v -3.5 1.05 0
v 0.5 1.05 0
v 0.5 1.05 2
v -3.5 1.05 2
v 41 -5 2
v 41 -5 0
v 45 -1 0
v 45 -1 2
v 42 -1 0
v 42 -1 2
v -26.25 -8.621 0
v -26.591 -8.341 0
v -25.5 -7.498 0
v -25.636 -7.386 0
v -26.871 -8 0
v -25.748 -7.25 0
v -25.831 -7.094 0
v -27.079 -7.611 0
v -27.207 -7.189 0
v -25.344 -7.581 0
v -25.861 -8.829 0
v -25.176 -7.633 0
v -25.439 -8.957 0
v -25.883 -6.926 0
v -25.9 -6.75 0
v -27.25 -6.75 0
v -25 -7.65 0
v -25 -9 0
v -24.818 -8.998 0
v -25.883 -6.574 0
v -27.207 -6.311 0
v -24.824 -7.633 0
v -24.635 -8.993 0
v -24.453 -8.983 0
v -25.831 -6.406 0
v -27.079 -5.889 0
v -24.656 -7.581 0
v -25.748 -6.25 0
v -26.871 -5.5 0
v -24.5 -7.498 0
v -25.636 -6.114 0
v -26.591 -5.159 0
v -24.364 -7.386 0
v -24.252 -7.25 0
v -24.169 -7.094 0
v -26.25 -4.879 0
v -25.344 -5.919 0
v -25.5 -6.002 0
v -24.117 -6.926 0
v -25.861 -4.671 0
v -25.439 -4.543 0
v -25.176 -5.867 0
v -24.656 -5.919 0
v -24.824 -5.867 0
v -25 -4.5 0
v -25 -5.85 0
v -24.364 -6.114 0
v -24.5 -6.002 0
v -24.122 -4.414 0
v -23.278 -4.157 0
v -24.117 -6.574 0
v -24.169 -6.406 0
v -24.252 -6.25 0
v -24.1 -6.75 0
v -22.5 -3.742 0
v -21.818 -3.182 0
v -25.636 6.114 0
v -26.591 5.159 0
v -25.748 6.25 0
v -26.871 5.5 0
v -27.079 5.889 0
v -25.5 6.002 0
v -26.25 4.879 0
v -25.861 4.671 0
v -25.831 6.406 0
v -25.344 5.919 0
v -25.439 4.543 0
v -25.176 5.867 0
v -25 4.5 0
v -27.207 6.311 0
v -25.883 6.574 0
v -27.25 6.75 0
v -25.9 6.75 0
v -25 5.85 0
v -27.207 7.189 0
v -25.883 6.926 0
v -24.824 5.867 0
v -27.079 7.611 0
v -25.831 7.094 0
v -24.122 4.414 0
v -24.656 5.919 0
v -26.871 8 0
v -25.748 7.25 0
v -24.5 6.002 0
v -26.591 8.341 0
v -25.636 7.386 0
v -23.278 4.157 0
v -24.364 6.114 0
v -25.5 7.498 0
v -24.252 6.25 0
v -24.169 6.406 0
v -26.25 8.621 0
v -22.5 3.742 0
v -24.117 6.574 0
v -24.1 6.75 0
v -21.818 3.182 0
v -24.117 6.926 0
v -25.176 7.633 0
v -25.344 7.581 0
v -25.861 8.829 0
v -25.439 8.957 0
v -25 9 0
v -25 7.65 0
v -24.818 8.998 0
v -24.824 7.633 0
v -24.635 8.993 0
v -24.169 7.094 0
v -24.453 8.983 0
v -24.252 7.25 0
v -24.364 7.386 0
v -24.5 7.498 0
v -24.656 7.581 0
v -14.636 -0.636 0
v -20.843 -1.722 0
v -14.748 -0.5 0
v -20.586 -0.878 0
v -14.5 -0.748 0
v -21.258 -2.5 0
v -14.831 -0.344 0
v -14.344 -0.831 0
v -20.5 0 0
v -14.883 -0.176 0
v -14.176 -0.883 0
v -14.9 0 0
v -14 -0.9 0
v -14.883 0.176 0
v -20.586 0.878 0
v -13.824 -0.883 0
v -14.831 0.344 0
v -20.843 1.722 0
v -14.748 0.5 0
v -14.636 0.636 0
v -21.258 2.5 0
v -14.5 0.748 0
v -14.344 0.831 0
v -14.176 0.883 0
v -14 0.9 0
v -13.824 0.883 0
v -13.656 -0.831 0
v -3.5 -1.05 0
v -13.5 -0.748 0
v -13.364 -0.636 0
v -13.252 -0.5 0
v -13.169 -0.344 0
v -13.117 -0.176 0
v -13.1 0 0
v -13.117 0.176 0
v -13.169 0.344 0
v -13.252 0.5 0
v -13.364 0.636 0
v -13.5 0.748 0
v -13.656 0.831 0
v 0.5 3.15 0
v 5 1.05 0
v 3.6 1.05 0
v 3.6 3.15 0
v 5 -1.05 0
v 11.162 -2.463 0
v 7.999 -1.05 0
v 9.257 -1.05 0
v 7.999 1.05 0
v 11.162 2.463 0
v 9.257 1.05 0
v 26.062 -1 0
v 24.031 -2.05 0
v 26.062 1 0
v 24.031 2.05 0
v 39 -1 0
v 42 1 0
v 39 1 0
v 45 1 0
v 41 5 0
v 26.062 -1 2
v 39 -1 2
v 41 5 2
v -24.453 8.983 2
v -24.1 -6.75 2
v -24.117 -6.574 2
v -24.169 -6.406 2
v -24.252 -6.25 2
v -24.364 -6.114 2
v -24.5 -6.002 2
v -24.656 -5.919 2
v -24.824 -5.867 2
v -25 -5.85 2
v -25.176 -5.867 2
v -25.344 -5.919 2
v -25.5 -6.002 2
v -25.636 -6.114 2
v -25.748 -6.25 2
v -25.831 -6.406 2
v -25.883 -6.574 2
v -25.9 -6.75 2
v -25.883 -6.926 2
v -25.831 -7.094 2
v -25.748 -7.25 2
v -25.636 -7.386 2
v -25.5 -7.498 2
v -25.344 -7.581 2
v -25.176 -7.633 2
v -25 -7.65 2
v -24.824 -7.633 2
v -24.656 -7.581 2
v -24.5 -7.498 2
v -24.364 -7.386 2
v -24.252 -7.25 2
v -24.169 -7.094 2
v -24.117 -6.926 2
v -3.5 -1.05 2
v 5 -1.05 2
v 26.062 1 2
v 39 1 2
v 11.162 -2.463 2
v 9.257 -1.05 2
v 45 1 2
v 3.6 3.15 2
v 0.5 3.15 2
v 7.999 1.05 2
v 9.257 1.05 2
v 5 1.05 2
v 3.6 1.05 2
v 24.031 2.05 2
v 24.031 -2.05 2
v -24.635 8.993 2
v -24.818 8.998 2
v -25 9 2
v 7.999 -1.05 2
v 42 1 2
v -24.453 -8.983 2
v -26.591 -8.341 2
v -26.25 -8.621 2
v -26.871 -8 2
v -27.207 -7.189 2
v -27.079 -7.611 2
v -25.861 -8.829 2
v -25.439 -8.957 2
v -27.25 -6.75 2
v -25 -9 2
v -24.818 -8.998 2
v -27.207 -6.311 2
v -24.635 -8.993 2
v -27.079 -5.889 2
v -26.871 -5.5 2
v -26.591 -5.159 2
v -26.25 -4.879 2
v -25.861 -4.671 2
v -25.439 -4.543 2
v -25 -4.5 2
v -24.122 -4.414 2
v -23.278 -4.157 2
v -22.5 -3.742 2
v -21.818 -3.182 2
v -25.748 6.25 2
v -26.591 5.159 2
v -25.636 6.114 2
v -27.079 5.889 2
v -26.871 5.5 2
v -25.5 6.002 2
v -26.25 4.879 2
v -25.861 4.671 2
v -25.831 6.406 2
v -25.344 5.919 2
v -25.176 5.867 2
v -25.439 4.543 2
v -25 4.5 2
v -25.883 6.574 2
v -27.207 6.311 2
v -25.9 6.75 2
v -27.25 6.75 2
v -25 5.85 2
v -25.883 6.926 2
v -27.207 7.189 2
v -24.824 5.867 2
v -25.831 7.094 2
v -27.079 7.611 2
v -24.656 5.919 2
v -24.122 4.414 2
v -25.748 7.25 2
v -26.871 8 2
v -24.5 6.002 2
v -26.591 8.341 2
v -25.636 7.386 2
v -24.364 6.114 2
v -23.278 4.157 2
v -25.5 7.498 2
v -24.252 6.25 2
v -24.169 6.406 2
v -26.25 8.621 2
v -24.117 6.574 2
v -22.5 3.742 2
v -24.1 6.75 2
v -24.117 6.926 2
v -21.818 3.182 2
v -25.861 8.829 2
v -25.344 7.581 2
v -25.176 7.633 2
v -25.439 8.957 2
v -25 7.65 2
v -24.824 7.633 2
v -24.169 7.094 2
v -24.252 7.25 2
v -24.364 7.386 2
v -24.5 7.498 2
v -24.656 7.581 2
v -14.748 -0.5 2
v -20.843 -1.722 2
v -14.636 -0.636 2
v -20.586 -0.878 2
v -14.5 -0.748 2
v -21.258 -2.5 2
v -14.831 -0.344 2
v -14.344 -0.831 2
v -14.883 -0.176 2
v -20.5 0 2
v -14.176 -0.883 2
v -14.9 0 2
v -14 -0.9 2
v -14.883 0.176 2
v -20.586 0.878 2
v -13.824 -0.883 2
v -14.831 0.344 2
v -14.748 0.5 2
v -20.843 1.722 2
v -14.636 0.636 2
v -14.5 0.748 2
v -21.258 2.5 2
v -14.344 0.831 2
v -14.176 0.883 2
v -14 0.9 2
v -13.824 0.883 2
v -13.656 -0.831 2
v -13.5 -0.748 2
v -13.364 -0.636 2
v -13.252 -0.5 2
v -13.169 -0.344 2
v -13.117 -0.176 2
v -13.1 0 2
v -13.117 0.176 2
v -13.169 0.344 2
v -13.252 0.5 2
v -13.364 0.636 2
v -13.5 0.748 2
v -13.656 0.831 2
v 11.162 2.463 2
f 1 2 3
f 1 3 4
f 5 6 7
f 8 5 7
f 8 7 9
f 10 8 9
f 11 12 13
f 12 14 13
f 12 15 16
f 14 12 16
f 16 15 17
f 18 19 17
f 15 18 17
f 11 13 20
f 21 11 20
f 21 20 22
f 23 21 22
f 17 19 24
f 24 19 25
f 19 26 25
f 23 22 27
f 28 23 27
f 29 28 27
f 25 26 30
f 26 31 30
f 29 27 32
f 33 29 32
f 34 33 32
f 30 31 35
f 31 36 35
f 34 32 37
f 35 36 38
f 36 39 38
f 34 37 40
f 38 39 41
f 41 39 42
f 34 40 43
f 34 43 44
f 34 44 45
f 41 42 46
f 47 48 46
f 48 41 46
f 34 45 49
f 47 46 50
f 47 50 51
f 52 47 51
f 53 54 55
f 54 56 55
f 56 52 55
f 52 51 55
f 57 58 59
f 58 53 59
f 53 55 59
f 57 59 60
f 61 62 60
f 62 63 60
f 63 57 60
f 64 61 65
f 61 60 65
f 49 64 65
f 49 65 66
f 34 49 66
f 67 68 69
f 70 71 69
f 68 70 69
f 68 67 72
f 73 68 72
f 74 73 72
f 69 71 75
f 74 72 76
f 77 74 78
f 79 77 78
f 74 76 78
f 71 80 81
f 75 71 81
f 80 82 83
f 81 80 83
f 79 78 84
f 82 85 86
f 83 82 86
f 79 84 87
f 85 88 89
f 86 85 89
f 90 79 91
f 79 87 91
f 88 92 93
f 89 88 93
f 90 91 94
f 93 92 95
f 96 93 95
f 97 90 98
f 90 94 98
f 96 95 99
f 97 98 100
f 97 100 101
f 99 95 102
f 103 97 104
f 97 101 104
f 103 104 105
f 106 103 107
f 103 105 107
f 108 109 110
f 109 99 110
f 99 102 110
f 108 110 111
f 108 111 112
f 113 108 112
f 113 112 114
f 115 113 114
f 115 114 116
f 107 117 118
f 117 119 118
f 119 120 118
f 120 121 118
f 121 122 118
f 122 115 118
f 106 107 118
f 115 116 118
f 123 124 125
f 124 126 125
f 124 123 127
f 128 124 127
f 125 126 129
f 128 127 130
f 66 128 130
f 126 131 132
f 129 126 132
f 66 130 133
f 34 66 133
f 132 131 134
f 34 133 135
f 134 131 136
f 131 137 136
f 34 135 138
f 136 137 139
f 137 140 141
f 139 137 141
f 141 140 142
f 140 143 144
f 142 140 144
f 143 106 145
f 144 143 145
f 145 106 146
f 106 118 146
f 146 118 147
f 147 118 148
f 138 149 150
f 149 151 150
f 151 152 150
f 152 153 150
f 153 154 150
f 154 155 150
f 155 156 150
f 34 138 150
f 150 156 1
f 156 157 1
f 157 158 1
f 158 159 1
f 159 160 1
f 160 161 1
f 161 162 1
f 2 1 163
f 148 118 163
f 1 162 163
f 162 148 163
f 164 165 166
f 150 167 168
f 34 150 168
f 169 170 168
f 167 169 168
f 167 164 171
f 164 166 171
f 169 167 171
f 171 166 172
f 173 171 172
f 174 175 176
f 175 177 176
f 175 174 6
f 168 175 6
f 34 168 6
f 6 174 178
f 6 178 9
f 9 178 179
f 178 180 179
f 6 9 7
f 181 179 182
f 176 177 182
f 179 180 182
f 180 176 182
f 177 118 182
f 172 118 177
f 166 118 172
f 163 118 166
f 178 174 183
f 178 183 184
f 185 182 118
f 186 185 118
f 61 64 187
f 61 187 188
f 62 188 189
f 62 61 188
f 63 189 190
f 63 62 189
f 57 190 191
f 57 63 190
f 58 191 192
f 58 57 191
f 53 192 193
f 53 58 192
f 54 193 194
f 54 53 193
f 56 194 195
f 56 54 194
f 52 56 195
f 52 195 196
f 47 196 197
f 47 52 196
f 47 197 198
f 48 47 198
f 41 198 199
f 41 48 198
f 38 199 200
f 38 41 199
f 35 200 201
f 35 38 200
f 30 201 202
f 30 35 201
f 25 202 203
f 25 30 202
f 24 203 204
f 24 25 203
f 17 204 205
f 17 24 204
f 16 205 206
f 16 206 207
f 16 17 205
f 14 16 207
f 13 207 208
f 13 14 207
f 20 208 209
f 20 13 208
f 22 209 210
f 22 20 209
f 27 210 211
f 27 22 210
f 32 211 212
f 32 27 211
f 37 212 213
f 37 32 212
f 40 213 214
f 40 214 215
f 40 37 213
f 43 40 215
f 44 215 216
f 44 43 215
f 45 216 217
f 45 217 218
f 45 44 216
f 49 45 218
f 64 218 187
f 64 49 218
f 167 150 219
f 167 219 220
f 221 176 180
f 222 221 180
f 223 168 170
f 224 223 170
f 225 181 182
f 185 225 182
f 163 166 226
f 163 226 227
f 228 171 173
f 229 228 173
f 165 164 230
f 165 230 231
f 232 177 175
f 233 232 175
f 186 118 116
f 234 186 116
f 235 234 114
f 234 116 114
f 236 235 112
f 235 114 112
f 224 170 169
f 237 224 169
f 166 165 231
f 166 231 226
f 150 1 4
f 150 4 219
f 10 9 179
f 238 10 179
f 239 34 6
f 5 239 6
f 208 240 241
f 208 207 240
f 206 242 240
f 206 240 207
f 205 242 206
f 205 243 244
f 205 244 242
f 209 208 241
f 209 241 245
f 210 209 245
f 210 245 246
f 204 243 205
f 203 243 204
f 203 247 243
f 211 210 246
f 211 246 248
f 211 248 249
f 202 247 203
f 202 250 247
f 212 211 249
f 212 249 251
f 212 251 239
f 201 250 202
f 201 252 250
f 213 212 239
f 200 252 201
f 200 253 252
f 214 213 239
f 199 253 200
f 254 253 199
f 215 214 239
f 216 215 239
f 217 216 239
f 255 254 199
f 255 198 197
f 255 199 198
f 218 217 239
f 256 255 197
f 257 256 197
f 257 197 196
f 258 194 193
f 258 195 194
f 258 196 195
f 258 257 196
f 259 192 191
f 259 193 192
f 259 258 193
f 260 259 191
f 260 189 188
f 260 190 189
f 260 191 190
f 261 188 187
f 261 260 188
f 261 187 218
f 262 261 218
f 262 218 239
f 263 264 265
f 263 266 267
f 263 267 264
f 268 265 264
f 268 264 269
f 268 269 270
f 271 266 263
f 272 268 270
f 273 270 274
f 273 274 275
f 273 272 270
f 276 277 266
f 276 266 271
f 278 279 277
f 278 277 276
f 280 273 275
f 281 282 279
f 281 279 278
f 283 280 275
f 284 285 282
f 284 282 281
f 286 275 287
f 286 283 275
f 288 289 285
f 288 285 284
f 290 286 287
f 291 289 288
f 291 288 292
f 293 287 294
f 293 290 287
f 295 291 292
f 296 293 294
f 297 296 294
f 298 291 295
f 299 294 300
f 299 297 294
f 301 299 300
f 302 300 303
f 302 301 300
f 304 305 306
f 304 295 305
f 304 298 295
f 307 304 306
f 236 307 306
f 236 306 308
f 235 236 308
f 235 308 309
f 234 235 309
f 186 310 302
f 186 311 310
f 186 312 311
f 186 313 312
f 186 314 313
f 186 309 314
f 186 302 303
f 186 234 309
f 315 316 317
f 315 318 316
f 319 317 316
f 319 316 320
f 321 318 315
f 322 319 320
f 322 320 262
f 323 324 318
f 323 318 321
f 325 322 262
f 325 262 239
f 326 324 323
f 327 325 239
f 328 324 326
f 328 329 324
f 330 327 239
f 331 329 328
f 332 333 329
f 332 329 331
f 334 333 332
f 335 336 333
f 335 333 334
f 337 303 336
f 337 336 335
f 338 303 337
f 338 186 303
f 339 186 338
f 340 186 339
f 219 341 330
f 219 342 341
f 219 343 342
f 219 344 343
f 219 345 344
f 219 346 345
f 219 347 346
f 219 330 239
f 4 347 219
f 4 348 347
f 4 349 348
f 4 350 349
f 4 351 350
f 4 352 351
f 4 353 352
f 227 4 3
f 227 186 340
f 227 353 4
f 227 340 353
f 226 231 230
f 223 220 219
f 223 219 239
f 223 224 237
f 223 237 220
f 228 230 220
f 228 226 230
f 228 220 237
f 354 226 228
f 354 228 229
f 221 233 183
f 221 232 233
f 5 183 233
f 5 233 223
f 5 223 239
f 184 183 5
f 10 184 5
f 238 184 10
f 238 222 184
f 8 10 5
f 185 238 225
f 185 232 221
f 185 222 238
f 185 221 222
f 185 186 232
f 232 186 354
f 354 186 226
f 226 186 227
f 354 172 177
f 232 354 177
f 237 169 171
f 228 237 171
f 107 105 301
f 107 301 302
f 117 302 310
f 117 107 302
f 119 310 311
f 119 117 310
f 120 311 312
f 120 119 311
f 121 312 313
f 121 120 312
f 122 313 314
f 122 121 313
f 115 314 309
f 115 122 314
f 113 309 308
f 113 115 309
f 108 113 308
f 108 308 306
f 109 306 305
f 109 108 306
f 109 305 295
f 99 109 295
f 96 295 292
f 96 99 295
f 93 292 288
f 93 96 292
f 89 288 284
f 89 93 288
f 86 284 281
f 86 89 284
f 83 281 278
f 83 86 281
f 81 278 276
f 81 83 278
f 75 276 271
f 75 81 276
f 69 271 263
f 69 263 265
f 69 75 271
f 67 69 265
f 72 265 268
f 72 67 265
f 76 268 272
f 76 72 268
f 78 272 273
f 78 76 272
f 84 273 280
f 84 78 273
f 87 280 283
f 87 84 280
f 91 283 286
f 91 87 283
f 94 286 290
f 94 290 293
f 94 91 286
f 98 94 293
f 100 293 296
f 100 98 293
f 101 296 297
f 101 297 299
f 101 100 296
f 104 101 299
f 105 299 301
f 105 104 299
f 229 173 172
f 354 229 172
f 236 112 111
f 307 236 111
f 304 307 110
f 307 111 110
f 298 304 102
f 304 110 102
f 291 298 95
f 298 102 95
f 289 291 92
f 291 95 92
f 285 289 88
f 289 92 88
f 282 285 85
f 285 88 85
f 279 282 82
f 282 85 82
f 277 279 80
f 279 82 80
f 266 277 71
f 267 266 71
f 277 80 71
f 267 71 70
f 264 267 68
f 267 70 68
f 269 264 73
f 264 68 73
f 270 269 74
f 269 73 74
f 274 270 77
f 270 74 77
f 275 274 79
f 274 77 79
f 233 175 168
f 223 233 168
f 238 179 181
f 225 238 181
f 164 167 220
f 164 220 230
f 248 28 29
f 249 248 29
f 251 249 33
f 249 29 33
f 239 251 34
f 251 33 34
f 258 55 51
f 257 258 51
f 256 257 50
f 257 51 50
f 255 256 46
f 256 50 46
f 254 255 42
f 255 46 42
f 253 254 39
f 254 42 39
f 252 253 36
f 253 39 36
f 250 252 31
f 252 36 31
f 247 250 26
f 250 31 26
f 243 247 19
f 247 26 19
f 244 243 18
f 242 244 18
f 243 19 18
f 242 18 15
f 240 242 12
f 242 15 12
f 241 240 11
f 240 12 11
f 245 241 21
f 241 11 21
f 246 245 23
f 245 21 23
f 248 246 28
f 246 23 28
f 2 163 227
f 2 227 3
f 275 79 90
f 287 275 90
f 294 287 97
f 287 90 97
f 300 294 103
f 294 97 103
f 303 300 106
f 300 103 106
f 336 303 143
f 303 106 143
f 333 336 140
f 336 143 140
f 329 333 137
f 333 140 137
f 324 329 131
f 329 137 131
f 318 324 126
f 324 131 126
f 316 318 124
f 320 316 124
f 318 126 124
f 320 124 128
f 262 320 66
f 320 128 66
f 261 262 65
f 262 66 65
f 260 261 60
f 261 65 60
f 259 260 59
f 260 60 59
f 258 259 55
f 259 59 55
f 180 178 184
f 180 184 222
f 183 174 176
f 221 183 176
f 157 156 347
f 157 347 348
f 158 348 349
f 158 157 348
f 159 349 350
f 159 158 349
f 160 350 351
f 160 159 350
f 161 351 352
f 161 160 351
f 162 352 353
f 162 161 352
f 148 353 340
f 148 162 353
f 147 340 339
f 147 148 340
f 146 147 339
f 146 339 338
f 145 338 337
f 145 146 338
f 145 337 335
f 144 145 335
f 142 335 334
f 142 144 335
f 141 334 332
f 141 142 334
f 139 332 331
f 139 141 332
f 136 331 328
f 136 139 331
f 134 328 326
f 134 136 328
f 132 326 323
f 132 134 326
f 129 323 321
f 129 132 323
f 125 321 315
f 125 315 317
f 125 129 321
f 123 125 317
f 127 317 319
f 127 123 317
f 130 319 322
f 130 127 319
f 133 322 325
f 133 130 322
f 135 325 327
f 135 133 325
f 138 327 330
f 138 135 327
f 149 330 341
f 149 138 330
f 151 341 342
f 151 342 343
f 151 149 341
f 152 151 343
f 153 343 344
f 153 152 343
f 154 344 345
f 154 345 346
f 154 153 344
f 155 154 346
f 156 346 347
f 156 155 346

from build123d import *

# Parameters (mm, degrees)
SKETCH_1_R      = 0.9
SKETCH_1_W      = 12.938114719
SKETCH_1_H      = 2
EXTRUDE_1_DEPTH = 2


with BuildPart() as part:
    # 草图1 → 凸台-拉伸1 (new body)
    with BuildSketch(Plane.XY):
        with BuildLine():
            Line((42, 1), (45, 1))
            Line((45, 1), (41, 5))
            Line((41, 5), (-24.453286313, 8.983379328))
            ThreePointArc((-24.453286313, 8.983379328), (-24.726516864, 8.995843872), (-25, 9))
            ThreePointArc((-25, 9), (-27.25, 6.75), (-25, 4.5))
            ThreePointArc((-25, 4.5), (-20.5, 0), (-25, -4.5))
            ThreePointArc((-25, -4.5), (-27.25, -6.75), (-25, -9))
            ThreePointArc((-25, -9), (-24.726516864, -8.995843872), (-24.453286313, -8.983379328))
            Line((-24.453286313, -8.983379328), (41, -5))
            Line((41, -5), (45, -1))
            Line((45, -1), (42, -1))
            Line((42, -1), (42, 1))
        make_face()
        with Locations((-25, 6.75)):
            Circle(SKETCH_1_R, mode=Mode.SUBTRACT)
        with Locations((-25, -6.75)):
            Circle(SKETCH_1_R, mode=Mode.SUBTRACT)
        with Locations((-14, 0)):
            Circle(SKETCH_1_R, mode=Mode.SUBTRACT)
        Polygon((5, 1.05), (3.6, 1.05), (3.6, 3.15), (0.5, 3.15), (0.5, 1.05), (-3.5, 1.05), (-3.5, -1.05), (5, -1.05), align=None, mode=Mode.SUBTRACT)
        with Locations((32.530942641, 0)):
            Rectangle(SKETCH_1_W, SKETCH_1_H, mode=Mode.SUBTRACT)
        Polygon((24.030895161, -2.05), (11.162143386, -2.463125002), (9.25663283, -1.05), (7.998759736, -1.05), (7.998759736, 1.05), (9.25663283, 1.05), (11.162143386, 2.463125002), (24.030895161, 2.05), align=None, mode=Mode.SUBTRACT)
    extrude(amount=EXTRUDE_1_DEPTH)


solid = part.part
